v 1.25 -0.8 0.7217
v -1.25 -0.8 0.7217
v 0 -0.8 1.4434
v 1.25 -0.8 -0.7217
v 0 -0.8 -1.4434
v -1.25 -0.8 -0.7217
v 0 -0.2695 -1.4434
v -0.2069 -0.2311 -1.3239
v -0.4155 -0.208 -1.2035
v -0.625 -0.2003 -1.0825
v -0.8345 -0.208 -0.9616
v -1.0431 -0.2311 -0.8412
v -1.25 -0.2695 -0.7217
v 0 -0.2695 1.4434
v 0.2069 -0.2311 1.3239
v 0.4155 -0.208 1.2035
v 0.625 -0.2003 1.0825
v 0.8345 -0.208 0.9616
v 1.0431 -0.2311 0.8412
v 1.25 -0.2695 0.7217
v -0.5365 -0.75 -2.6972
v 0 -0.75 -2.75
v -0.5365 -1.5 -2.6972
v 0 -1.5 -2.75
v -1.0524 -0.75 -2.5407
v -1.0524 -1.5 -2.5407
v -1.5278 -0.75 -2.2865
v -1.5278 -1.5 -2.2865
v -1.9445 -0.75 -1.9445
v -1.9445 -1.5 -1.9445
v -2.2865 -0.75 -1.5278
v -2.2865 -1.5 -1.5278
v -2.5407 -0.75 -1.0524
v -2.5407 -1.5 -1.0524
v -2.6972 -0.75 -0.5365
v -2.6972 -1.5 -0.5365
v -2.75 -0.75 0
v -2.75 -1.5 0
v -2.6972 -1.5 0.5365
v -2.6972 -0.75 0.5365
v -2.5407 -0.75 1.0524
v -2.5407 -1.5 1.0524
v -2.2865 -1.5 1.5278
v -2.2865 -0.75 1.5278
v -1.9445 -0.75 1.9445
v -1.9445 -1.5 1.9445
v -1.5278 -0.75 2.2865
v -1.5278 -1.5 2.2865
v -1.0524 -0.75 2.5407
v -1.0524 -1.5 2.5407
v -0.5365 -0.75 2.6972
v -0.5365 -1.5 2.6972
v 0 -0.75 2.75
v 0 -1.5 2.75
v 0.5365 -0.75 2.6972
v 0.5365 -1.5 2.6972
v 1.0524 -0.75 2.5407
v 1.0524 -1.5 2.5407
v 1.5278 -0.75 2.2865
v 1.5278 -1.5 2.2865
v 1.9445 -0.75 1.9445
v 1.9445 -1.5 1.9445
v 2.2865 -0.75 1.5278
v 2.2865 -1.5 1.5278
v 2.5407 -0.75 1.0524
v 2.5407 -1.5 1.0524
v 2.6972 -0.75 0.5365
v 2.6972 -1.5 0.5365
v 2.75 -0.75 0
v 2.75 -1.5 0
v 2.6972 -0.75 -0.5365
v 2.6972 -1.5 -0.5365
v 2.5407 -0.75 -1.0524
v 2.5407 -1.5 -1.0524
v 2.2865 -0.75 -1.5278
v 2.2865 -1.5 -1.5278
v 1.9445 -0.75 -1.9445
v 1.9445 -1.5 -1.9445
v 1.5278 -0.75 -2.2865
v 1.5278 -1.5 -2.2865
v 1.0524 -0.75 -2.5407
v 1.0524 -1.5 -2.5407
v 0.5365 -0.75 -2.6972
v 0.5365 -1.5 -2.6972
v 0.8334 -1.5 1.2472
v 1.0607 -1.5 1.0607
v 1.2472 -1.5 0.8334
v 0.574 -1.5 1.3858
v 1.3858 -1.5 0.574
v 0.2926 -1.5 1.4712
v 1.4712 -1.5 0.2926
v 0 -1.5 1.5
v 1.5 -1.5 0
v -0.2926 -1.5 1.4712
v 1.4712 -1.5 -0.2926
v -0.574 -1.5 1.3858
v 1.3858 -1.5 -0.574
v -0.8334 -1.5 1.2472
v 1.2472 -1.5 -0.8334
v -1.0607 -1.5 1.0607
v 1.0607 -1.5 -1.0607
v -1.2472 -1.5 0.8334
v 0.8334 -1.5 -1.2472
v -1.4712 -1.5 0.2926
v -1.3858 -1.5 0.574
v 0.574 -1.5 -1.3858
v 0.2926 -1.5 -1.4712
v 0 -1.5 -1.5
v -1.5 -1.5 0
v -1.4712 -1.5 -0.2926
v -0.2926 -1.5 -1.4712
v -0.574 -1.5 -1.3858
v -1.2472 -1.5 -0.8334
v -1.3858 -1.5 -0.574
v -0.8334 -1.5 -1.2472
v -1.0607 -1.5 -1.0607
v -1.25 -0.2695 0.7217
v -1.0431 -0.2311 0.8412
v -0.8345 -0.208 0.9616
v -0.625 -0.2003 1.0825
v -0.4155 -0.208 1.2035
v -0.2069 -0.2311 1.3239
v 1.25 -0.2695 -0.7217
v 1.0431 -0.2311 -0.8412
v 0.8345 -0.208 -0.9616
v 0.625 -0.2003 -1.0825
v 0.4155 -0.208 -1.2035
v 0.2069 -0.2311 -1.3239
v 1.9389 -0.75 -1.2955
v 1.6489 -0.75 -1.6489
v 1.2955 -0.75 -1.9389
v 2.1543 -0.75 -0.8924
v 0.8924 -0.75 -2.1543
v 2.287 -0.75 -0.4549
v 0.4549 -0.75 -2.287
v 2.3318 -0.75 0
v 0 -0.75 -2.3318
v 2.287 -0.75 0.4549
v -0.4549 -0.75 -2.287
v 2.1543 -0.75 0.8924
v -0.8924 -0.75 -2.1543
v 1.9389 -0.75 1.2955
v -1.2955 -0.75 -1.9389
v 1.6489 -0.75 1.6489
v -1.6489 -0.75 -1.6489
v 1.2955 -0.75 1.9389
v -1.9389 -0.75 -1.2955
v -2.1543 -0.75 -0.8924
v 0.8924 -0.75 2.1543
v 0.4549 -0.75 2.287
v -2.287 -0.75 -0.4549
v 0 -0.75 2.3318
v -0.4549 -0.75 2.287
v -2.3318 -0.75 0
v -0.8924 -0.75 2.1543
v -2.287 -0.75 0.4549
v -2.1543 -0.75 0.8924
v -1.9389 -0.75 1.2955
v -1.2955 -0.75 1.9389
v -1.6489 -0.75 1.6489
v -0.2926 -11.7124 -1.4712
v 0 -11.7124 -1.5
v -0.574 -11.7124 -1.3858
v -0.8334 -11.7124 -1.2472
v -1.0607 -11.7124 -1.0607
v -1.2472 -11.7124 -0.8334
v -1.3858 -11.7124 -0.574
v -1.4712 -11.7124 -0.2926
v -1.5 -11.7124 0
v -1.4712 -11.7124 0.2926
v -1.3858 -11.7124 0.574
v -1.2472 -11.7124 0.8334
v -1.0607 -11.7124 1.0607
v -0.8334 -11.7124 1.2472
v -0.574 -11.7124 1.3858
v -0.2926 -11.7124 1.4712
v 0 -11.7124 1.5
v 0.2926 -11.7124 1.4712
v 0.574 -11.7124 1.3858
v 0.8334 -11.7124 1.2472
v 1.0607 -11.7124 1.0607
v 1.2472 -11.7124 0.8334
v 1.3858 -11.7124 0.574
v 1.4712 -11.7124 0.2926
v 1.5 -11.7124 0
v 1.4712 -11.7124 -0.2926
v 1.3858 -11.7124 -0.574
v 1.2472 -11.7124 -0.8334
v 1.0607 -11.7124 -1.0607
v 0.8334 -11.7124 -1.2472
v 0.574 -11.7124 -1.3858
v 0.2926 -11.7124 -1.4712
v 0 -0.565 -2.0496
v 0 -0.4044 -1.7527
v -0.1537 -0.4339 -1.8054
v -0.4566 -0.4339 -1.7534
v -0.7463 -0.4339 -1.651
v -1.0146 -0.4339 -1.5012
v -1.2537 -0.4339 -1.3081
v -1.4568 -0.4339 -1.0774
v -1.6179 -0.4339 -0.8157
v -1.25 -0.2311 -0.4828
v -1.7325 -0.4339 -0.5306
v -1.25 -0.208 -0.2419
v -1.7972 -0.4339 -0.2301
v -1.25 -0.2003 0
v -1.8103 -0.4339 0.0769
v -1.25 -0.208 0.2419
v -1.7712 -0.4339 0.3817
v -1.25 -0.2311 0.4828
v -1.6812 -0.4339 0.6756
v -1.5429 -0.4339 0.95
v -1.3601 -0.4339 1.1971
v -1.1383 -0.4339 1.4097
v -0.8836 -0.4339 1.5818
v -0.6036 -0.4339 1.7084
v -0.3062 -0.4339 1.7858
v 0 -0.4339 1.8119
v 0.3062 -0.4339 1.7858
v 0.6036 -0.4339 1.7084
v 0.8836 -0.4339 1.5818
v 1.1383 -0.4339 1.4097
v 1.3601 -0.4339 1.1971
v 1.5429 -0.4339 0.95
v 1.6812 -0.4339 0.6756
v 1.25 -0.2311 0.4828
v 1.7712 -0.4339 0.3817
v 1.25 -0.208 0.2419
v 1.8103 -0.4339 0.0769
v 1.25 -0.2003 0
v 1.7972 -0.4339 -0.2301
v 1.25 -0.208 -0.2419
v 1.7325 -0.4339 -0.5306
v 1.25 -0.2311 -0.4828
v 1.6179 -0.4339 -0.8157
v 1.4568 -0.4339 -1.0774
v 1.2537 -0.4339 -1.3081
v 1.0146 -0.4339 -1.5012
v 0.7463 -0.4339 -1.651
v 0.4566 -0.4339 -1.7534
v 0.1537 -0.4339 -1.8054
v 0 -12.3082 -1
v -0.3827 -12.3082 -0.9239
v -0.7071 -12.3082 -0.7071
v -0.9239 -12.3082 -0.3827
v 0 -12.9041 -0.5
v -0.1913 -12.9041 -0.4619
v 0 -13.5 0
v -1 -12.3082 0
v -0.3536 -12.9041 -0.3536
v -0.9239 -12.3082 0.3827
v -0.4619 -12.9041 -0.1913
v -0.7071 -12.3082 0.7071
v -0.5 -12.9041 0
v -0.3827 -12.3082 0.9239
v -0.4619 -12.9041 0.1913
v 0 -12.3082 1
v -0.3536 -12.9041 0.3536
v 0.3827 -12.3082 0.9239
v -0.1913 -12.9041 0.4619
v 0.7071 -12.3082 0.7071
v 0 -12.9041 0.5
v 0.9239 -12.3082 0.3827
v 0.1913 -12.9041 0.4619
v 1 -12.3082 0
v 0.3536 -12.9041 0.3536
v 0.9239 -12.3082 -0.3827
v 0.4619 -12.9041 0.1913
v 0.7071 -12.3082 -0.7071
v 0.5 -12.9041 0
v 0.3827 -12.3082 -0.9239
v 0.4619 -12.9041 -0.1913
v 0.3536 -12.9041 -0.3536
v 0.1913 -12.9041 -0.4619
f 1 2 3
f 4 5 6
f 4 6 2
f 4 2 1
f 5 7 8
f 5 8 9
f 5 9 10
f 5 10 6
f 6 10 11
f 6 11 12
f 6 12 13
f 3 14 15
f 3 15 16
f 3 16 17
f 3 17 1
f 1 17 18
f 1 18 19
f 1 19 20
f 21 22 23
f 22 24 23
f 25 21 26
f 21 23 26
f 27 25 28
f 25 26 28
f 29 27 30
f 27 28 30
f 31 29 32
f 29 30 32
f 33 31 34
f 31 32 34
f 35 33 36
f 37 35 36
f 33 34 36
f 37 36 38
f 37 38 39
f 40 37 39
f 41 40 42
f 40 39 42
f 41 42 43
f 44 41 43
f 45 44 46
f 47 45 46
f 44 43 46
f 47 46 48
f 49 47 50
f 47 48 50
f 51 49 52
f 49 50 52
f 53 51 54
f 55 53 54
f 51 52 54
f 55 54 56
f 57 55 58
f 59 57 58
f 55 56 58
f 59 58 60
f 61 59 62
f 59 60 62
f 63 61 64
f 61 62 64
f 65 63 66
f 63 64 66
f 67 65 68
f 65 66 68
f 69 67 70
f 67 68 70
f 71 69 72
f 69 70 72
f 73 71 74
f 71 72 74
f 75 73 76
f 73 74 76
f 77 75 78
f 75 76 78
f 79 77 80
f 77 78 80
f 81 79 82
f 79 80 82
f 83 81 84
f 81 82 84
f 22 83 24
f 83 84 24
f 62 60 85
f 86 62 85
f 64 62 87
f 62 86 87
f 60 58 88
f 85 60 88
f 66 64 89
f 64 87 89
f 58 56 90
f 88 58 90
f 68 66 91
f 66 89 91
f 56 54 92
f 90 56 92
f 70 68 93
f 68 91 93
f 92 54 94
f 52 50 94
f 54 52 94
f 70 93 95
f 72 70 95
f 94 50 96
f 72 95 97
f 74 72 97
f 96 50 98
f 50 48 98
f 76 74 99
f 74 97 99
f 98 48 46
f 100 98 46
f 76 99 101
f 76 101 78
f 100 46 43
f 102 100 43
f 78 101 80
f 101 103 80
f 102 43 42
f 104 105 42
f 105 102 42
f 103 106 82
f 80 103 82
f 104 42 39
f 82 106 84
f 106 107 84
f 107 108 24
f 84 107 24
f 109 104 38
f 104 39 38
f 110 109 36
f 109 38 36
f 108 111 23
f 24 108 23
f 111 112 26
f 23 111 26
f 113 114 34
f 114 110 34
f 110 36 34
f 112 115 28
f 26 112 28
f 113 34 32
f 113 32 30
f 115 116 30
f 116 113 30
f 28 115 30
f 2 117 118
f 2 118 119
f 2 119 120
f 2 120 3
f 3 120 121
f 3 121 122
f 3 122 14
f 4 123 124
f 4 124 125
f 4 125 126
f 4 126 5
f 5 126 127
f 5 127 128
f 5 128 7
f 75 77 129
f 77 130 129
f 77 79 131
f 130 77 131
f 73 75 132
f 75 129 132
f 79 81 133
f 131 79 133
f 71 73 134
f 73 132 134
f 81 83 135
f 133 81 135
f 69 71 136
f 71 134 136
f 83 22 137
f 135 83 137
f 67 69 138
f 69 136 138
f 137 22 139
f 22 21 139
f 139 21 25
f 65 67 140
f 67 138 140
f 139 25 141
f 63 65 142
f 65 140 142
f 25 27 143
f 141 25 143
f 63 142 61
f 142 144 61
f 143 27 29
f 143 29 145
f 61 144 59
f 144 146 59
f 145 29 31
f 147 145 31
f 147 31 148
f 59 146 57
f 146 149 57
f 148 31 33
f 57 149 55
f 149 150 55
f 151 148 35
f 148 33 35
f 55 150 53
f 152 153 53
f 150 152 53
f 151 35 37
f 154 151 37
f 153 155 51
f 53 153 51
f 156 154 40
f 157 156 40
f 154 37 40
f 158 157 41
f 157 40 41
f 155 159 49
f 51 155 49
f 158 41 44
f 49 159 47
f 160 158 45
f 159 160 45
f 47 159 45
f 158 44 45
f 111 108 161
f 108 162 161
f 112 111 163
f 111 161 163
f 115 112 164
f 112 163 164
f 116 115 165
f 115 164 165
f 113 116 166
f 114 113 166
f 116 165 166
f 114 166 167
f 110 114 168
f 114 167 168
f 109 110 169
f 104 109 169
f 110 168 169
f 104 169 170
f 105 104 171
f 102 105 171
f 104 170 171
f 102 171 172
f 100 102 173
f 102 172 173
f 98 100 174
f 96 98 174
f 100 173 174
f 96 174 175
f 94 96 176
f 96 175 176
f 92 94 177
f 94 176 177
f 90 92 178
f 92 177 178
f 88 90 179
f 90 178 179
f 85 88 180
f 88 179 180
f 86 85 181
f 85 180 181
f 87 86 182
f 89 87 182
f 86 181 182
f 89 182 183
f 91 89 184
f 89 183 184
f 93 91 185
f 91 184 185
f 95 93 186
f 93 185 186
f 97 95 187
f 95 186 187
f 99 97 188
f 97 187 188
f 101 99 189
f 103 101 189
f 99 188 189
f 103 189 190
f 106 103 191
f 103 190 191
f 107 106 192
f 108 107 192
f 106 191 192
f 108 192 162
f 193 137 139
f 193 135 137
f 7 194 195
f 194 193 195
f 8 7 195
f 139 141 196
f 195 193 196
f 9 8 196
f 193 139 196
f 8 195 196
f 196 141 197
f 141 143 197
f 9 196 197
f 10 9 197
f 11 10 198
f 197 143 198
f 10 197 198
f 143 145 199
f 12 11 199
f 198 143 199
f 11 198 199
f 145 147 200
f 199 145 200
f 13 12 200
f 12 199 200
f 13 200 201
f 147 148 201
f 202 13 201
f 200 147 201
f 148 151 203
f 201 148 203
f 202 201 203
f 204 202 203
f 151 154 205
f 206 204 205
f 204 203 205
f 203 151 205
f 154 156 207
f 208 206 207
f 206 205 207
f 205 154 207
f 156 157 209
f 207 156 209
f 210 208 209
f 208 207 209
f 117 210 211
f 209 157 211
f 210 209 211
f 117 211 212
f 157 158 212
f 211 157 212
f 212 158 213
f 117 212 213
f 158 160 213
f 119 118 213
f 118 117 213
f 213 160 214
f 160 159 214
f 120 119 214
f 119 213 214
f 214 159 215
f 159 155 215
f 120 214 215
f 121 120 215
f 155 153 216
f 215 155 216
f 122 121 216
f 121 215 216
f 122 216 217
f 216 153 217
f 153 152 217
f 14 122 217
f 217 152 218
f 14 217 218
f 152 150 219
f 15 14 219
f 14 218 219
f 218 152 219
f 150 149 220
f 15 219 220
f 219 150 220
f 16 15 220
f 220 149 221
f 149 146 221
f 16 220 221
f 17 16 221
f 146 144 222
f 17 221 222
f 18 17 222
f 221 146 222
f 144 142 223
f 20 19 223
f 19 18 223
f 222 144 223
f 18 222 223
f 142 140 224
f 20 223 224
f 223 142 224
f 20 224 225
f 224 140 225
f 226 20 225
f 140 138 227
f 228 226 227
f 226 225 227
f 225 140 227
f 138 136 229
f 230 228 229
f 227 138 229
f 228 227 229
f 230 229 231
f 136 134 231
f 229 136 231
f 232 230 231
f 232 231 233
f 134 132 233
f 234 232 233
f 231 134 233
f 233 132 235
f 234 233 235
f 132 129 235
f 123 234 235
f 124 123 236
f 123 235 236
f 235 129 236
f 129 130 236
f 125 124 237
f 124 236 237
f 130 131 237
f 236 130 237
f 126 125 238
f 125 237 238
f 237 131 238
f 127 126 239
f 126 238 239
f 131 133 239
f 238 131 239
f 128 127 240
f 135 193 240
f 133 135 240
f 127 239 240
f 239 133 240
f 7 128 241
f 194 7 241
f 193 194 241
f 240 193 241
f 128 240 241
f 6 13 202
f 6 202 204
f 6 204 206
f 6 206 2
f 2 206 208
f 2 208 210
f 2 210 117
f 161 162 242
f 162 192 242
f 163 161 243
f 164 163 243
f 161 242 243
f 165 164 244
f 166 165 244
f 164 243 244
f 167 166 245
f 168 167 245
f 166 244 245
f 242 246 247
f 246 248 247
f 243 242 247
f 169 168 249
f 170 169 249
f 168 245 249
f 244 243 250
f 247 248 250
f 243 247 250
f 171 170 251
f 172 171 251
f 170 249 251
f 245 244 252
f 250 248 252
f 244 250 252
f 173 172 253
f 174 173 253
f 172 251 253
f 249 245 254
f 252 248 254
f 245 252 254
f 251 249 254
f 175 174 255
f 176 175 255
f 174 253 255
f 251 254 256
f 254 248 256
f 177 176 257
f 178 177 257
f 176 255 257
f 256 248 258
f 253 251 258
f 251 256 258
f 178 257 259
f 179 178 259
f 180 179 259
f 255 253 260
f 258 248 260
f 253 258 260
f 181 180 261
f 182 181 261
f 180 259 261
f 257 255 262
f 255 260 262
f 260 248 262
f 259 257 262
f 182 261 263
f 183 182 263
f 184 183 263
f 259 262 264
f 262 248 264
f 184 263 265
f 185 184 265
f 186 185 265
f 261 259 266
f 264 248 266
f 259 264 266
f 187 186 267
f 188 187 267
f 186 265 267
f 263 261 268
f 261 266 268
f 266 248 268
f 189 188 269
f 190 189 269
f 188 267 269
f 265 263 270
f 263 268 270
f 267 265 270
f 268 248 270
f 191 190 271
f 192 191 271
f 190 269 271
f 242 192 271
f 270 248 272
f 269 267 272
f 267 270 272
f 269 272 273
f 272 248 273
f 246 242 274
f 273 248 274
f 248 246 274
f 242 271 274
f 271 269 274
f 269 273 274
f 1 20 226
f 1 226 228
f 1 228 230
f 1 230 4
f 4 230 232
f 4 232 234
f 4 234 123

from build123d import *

# Parameters (mm, degrees)
ENL_V_MAT_EXTRU_1_DEPTH = 0.8


with BuildPart() as part:
    # Esquisse1 → Révolution1 (revolve)
    with BuildSketch(Plane.XY, mode=Mode.PRIVATE) as r_volution1_sk:
        with BuildLine():
            Line((-2.75, -1.5), (-1.5, -1.5))
            Line((-1.5, -1.5), (-1.5, -11.712369611))
            Line((-1.5, -11.712369611), (0, -13.5))
            Line((0, -13.5), (0, 0))
            ThreePointArc((0, 0), (-1.224744871, -0.192113447), (-2.331844763, -0.75))
            Line((-2.331844763, -0.75), (-2.75, -0.75))
            Line((-2.75, -0.75), (-2.75, -1.5))
        make_face()
    revolve(r_volution1_sk.sketch.rotate(Axis((0, -18.848412698, 0), (0, 1, 0)), 270), axis=Axis((0, -18.848412698, 0), (0, 1, 0)))  # turned: the seam where the file's is

    # Esquisse2 → Enlèv. mat.-Extru.1 (cut)
    with BuildSketch(Plane(origin=(0, 0, 0), x_dir=(1, 0, 0), z_dir=(0, 1, 0))):
        Polygon((0, 1.443375673), (-1.25, 0.721687836), (-1.25, -0.721687836), (0, -1.443375673), (1.25, -0.721687836), (1.25, 0.721687836), align=None)
    extrude(amount=-ENL_V_MAT_EXTRU_1_DEPTH, mode=Mode.SUBTRACT)


solid = part.part
